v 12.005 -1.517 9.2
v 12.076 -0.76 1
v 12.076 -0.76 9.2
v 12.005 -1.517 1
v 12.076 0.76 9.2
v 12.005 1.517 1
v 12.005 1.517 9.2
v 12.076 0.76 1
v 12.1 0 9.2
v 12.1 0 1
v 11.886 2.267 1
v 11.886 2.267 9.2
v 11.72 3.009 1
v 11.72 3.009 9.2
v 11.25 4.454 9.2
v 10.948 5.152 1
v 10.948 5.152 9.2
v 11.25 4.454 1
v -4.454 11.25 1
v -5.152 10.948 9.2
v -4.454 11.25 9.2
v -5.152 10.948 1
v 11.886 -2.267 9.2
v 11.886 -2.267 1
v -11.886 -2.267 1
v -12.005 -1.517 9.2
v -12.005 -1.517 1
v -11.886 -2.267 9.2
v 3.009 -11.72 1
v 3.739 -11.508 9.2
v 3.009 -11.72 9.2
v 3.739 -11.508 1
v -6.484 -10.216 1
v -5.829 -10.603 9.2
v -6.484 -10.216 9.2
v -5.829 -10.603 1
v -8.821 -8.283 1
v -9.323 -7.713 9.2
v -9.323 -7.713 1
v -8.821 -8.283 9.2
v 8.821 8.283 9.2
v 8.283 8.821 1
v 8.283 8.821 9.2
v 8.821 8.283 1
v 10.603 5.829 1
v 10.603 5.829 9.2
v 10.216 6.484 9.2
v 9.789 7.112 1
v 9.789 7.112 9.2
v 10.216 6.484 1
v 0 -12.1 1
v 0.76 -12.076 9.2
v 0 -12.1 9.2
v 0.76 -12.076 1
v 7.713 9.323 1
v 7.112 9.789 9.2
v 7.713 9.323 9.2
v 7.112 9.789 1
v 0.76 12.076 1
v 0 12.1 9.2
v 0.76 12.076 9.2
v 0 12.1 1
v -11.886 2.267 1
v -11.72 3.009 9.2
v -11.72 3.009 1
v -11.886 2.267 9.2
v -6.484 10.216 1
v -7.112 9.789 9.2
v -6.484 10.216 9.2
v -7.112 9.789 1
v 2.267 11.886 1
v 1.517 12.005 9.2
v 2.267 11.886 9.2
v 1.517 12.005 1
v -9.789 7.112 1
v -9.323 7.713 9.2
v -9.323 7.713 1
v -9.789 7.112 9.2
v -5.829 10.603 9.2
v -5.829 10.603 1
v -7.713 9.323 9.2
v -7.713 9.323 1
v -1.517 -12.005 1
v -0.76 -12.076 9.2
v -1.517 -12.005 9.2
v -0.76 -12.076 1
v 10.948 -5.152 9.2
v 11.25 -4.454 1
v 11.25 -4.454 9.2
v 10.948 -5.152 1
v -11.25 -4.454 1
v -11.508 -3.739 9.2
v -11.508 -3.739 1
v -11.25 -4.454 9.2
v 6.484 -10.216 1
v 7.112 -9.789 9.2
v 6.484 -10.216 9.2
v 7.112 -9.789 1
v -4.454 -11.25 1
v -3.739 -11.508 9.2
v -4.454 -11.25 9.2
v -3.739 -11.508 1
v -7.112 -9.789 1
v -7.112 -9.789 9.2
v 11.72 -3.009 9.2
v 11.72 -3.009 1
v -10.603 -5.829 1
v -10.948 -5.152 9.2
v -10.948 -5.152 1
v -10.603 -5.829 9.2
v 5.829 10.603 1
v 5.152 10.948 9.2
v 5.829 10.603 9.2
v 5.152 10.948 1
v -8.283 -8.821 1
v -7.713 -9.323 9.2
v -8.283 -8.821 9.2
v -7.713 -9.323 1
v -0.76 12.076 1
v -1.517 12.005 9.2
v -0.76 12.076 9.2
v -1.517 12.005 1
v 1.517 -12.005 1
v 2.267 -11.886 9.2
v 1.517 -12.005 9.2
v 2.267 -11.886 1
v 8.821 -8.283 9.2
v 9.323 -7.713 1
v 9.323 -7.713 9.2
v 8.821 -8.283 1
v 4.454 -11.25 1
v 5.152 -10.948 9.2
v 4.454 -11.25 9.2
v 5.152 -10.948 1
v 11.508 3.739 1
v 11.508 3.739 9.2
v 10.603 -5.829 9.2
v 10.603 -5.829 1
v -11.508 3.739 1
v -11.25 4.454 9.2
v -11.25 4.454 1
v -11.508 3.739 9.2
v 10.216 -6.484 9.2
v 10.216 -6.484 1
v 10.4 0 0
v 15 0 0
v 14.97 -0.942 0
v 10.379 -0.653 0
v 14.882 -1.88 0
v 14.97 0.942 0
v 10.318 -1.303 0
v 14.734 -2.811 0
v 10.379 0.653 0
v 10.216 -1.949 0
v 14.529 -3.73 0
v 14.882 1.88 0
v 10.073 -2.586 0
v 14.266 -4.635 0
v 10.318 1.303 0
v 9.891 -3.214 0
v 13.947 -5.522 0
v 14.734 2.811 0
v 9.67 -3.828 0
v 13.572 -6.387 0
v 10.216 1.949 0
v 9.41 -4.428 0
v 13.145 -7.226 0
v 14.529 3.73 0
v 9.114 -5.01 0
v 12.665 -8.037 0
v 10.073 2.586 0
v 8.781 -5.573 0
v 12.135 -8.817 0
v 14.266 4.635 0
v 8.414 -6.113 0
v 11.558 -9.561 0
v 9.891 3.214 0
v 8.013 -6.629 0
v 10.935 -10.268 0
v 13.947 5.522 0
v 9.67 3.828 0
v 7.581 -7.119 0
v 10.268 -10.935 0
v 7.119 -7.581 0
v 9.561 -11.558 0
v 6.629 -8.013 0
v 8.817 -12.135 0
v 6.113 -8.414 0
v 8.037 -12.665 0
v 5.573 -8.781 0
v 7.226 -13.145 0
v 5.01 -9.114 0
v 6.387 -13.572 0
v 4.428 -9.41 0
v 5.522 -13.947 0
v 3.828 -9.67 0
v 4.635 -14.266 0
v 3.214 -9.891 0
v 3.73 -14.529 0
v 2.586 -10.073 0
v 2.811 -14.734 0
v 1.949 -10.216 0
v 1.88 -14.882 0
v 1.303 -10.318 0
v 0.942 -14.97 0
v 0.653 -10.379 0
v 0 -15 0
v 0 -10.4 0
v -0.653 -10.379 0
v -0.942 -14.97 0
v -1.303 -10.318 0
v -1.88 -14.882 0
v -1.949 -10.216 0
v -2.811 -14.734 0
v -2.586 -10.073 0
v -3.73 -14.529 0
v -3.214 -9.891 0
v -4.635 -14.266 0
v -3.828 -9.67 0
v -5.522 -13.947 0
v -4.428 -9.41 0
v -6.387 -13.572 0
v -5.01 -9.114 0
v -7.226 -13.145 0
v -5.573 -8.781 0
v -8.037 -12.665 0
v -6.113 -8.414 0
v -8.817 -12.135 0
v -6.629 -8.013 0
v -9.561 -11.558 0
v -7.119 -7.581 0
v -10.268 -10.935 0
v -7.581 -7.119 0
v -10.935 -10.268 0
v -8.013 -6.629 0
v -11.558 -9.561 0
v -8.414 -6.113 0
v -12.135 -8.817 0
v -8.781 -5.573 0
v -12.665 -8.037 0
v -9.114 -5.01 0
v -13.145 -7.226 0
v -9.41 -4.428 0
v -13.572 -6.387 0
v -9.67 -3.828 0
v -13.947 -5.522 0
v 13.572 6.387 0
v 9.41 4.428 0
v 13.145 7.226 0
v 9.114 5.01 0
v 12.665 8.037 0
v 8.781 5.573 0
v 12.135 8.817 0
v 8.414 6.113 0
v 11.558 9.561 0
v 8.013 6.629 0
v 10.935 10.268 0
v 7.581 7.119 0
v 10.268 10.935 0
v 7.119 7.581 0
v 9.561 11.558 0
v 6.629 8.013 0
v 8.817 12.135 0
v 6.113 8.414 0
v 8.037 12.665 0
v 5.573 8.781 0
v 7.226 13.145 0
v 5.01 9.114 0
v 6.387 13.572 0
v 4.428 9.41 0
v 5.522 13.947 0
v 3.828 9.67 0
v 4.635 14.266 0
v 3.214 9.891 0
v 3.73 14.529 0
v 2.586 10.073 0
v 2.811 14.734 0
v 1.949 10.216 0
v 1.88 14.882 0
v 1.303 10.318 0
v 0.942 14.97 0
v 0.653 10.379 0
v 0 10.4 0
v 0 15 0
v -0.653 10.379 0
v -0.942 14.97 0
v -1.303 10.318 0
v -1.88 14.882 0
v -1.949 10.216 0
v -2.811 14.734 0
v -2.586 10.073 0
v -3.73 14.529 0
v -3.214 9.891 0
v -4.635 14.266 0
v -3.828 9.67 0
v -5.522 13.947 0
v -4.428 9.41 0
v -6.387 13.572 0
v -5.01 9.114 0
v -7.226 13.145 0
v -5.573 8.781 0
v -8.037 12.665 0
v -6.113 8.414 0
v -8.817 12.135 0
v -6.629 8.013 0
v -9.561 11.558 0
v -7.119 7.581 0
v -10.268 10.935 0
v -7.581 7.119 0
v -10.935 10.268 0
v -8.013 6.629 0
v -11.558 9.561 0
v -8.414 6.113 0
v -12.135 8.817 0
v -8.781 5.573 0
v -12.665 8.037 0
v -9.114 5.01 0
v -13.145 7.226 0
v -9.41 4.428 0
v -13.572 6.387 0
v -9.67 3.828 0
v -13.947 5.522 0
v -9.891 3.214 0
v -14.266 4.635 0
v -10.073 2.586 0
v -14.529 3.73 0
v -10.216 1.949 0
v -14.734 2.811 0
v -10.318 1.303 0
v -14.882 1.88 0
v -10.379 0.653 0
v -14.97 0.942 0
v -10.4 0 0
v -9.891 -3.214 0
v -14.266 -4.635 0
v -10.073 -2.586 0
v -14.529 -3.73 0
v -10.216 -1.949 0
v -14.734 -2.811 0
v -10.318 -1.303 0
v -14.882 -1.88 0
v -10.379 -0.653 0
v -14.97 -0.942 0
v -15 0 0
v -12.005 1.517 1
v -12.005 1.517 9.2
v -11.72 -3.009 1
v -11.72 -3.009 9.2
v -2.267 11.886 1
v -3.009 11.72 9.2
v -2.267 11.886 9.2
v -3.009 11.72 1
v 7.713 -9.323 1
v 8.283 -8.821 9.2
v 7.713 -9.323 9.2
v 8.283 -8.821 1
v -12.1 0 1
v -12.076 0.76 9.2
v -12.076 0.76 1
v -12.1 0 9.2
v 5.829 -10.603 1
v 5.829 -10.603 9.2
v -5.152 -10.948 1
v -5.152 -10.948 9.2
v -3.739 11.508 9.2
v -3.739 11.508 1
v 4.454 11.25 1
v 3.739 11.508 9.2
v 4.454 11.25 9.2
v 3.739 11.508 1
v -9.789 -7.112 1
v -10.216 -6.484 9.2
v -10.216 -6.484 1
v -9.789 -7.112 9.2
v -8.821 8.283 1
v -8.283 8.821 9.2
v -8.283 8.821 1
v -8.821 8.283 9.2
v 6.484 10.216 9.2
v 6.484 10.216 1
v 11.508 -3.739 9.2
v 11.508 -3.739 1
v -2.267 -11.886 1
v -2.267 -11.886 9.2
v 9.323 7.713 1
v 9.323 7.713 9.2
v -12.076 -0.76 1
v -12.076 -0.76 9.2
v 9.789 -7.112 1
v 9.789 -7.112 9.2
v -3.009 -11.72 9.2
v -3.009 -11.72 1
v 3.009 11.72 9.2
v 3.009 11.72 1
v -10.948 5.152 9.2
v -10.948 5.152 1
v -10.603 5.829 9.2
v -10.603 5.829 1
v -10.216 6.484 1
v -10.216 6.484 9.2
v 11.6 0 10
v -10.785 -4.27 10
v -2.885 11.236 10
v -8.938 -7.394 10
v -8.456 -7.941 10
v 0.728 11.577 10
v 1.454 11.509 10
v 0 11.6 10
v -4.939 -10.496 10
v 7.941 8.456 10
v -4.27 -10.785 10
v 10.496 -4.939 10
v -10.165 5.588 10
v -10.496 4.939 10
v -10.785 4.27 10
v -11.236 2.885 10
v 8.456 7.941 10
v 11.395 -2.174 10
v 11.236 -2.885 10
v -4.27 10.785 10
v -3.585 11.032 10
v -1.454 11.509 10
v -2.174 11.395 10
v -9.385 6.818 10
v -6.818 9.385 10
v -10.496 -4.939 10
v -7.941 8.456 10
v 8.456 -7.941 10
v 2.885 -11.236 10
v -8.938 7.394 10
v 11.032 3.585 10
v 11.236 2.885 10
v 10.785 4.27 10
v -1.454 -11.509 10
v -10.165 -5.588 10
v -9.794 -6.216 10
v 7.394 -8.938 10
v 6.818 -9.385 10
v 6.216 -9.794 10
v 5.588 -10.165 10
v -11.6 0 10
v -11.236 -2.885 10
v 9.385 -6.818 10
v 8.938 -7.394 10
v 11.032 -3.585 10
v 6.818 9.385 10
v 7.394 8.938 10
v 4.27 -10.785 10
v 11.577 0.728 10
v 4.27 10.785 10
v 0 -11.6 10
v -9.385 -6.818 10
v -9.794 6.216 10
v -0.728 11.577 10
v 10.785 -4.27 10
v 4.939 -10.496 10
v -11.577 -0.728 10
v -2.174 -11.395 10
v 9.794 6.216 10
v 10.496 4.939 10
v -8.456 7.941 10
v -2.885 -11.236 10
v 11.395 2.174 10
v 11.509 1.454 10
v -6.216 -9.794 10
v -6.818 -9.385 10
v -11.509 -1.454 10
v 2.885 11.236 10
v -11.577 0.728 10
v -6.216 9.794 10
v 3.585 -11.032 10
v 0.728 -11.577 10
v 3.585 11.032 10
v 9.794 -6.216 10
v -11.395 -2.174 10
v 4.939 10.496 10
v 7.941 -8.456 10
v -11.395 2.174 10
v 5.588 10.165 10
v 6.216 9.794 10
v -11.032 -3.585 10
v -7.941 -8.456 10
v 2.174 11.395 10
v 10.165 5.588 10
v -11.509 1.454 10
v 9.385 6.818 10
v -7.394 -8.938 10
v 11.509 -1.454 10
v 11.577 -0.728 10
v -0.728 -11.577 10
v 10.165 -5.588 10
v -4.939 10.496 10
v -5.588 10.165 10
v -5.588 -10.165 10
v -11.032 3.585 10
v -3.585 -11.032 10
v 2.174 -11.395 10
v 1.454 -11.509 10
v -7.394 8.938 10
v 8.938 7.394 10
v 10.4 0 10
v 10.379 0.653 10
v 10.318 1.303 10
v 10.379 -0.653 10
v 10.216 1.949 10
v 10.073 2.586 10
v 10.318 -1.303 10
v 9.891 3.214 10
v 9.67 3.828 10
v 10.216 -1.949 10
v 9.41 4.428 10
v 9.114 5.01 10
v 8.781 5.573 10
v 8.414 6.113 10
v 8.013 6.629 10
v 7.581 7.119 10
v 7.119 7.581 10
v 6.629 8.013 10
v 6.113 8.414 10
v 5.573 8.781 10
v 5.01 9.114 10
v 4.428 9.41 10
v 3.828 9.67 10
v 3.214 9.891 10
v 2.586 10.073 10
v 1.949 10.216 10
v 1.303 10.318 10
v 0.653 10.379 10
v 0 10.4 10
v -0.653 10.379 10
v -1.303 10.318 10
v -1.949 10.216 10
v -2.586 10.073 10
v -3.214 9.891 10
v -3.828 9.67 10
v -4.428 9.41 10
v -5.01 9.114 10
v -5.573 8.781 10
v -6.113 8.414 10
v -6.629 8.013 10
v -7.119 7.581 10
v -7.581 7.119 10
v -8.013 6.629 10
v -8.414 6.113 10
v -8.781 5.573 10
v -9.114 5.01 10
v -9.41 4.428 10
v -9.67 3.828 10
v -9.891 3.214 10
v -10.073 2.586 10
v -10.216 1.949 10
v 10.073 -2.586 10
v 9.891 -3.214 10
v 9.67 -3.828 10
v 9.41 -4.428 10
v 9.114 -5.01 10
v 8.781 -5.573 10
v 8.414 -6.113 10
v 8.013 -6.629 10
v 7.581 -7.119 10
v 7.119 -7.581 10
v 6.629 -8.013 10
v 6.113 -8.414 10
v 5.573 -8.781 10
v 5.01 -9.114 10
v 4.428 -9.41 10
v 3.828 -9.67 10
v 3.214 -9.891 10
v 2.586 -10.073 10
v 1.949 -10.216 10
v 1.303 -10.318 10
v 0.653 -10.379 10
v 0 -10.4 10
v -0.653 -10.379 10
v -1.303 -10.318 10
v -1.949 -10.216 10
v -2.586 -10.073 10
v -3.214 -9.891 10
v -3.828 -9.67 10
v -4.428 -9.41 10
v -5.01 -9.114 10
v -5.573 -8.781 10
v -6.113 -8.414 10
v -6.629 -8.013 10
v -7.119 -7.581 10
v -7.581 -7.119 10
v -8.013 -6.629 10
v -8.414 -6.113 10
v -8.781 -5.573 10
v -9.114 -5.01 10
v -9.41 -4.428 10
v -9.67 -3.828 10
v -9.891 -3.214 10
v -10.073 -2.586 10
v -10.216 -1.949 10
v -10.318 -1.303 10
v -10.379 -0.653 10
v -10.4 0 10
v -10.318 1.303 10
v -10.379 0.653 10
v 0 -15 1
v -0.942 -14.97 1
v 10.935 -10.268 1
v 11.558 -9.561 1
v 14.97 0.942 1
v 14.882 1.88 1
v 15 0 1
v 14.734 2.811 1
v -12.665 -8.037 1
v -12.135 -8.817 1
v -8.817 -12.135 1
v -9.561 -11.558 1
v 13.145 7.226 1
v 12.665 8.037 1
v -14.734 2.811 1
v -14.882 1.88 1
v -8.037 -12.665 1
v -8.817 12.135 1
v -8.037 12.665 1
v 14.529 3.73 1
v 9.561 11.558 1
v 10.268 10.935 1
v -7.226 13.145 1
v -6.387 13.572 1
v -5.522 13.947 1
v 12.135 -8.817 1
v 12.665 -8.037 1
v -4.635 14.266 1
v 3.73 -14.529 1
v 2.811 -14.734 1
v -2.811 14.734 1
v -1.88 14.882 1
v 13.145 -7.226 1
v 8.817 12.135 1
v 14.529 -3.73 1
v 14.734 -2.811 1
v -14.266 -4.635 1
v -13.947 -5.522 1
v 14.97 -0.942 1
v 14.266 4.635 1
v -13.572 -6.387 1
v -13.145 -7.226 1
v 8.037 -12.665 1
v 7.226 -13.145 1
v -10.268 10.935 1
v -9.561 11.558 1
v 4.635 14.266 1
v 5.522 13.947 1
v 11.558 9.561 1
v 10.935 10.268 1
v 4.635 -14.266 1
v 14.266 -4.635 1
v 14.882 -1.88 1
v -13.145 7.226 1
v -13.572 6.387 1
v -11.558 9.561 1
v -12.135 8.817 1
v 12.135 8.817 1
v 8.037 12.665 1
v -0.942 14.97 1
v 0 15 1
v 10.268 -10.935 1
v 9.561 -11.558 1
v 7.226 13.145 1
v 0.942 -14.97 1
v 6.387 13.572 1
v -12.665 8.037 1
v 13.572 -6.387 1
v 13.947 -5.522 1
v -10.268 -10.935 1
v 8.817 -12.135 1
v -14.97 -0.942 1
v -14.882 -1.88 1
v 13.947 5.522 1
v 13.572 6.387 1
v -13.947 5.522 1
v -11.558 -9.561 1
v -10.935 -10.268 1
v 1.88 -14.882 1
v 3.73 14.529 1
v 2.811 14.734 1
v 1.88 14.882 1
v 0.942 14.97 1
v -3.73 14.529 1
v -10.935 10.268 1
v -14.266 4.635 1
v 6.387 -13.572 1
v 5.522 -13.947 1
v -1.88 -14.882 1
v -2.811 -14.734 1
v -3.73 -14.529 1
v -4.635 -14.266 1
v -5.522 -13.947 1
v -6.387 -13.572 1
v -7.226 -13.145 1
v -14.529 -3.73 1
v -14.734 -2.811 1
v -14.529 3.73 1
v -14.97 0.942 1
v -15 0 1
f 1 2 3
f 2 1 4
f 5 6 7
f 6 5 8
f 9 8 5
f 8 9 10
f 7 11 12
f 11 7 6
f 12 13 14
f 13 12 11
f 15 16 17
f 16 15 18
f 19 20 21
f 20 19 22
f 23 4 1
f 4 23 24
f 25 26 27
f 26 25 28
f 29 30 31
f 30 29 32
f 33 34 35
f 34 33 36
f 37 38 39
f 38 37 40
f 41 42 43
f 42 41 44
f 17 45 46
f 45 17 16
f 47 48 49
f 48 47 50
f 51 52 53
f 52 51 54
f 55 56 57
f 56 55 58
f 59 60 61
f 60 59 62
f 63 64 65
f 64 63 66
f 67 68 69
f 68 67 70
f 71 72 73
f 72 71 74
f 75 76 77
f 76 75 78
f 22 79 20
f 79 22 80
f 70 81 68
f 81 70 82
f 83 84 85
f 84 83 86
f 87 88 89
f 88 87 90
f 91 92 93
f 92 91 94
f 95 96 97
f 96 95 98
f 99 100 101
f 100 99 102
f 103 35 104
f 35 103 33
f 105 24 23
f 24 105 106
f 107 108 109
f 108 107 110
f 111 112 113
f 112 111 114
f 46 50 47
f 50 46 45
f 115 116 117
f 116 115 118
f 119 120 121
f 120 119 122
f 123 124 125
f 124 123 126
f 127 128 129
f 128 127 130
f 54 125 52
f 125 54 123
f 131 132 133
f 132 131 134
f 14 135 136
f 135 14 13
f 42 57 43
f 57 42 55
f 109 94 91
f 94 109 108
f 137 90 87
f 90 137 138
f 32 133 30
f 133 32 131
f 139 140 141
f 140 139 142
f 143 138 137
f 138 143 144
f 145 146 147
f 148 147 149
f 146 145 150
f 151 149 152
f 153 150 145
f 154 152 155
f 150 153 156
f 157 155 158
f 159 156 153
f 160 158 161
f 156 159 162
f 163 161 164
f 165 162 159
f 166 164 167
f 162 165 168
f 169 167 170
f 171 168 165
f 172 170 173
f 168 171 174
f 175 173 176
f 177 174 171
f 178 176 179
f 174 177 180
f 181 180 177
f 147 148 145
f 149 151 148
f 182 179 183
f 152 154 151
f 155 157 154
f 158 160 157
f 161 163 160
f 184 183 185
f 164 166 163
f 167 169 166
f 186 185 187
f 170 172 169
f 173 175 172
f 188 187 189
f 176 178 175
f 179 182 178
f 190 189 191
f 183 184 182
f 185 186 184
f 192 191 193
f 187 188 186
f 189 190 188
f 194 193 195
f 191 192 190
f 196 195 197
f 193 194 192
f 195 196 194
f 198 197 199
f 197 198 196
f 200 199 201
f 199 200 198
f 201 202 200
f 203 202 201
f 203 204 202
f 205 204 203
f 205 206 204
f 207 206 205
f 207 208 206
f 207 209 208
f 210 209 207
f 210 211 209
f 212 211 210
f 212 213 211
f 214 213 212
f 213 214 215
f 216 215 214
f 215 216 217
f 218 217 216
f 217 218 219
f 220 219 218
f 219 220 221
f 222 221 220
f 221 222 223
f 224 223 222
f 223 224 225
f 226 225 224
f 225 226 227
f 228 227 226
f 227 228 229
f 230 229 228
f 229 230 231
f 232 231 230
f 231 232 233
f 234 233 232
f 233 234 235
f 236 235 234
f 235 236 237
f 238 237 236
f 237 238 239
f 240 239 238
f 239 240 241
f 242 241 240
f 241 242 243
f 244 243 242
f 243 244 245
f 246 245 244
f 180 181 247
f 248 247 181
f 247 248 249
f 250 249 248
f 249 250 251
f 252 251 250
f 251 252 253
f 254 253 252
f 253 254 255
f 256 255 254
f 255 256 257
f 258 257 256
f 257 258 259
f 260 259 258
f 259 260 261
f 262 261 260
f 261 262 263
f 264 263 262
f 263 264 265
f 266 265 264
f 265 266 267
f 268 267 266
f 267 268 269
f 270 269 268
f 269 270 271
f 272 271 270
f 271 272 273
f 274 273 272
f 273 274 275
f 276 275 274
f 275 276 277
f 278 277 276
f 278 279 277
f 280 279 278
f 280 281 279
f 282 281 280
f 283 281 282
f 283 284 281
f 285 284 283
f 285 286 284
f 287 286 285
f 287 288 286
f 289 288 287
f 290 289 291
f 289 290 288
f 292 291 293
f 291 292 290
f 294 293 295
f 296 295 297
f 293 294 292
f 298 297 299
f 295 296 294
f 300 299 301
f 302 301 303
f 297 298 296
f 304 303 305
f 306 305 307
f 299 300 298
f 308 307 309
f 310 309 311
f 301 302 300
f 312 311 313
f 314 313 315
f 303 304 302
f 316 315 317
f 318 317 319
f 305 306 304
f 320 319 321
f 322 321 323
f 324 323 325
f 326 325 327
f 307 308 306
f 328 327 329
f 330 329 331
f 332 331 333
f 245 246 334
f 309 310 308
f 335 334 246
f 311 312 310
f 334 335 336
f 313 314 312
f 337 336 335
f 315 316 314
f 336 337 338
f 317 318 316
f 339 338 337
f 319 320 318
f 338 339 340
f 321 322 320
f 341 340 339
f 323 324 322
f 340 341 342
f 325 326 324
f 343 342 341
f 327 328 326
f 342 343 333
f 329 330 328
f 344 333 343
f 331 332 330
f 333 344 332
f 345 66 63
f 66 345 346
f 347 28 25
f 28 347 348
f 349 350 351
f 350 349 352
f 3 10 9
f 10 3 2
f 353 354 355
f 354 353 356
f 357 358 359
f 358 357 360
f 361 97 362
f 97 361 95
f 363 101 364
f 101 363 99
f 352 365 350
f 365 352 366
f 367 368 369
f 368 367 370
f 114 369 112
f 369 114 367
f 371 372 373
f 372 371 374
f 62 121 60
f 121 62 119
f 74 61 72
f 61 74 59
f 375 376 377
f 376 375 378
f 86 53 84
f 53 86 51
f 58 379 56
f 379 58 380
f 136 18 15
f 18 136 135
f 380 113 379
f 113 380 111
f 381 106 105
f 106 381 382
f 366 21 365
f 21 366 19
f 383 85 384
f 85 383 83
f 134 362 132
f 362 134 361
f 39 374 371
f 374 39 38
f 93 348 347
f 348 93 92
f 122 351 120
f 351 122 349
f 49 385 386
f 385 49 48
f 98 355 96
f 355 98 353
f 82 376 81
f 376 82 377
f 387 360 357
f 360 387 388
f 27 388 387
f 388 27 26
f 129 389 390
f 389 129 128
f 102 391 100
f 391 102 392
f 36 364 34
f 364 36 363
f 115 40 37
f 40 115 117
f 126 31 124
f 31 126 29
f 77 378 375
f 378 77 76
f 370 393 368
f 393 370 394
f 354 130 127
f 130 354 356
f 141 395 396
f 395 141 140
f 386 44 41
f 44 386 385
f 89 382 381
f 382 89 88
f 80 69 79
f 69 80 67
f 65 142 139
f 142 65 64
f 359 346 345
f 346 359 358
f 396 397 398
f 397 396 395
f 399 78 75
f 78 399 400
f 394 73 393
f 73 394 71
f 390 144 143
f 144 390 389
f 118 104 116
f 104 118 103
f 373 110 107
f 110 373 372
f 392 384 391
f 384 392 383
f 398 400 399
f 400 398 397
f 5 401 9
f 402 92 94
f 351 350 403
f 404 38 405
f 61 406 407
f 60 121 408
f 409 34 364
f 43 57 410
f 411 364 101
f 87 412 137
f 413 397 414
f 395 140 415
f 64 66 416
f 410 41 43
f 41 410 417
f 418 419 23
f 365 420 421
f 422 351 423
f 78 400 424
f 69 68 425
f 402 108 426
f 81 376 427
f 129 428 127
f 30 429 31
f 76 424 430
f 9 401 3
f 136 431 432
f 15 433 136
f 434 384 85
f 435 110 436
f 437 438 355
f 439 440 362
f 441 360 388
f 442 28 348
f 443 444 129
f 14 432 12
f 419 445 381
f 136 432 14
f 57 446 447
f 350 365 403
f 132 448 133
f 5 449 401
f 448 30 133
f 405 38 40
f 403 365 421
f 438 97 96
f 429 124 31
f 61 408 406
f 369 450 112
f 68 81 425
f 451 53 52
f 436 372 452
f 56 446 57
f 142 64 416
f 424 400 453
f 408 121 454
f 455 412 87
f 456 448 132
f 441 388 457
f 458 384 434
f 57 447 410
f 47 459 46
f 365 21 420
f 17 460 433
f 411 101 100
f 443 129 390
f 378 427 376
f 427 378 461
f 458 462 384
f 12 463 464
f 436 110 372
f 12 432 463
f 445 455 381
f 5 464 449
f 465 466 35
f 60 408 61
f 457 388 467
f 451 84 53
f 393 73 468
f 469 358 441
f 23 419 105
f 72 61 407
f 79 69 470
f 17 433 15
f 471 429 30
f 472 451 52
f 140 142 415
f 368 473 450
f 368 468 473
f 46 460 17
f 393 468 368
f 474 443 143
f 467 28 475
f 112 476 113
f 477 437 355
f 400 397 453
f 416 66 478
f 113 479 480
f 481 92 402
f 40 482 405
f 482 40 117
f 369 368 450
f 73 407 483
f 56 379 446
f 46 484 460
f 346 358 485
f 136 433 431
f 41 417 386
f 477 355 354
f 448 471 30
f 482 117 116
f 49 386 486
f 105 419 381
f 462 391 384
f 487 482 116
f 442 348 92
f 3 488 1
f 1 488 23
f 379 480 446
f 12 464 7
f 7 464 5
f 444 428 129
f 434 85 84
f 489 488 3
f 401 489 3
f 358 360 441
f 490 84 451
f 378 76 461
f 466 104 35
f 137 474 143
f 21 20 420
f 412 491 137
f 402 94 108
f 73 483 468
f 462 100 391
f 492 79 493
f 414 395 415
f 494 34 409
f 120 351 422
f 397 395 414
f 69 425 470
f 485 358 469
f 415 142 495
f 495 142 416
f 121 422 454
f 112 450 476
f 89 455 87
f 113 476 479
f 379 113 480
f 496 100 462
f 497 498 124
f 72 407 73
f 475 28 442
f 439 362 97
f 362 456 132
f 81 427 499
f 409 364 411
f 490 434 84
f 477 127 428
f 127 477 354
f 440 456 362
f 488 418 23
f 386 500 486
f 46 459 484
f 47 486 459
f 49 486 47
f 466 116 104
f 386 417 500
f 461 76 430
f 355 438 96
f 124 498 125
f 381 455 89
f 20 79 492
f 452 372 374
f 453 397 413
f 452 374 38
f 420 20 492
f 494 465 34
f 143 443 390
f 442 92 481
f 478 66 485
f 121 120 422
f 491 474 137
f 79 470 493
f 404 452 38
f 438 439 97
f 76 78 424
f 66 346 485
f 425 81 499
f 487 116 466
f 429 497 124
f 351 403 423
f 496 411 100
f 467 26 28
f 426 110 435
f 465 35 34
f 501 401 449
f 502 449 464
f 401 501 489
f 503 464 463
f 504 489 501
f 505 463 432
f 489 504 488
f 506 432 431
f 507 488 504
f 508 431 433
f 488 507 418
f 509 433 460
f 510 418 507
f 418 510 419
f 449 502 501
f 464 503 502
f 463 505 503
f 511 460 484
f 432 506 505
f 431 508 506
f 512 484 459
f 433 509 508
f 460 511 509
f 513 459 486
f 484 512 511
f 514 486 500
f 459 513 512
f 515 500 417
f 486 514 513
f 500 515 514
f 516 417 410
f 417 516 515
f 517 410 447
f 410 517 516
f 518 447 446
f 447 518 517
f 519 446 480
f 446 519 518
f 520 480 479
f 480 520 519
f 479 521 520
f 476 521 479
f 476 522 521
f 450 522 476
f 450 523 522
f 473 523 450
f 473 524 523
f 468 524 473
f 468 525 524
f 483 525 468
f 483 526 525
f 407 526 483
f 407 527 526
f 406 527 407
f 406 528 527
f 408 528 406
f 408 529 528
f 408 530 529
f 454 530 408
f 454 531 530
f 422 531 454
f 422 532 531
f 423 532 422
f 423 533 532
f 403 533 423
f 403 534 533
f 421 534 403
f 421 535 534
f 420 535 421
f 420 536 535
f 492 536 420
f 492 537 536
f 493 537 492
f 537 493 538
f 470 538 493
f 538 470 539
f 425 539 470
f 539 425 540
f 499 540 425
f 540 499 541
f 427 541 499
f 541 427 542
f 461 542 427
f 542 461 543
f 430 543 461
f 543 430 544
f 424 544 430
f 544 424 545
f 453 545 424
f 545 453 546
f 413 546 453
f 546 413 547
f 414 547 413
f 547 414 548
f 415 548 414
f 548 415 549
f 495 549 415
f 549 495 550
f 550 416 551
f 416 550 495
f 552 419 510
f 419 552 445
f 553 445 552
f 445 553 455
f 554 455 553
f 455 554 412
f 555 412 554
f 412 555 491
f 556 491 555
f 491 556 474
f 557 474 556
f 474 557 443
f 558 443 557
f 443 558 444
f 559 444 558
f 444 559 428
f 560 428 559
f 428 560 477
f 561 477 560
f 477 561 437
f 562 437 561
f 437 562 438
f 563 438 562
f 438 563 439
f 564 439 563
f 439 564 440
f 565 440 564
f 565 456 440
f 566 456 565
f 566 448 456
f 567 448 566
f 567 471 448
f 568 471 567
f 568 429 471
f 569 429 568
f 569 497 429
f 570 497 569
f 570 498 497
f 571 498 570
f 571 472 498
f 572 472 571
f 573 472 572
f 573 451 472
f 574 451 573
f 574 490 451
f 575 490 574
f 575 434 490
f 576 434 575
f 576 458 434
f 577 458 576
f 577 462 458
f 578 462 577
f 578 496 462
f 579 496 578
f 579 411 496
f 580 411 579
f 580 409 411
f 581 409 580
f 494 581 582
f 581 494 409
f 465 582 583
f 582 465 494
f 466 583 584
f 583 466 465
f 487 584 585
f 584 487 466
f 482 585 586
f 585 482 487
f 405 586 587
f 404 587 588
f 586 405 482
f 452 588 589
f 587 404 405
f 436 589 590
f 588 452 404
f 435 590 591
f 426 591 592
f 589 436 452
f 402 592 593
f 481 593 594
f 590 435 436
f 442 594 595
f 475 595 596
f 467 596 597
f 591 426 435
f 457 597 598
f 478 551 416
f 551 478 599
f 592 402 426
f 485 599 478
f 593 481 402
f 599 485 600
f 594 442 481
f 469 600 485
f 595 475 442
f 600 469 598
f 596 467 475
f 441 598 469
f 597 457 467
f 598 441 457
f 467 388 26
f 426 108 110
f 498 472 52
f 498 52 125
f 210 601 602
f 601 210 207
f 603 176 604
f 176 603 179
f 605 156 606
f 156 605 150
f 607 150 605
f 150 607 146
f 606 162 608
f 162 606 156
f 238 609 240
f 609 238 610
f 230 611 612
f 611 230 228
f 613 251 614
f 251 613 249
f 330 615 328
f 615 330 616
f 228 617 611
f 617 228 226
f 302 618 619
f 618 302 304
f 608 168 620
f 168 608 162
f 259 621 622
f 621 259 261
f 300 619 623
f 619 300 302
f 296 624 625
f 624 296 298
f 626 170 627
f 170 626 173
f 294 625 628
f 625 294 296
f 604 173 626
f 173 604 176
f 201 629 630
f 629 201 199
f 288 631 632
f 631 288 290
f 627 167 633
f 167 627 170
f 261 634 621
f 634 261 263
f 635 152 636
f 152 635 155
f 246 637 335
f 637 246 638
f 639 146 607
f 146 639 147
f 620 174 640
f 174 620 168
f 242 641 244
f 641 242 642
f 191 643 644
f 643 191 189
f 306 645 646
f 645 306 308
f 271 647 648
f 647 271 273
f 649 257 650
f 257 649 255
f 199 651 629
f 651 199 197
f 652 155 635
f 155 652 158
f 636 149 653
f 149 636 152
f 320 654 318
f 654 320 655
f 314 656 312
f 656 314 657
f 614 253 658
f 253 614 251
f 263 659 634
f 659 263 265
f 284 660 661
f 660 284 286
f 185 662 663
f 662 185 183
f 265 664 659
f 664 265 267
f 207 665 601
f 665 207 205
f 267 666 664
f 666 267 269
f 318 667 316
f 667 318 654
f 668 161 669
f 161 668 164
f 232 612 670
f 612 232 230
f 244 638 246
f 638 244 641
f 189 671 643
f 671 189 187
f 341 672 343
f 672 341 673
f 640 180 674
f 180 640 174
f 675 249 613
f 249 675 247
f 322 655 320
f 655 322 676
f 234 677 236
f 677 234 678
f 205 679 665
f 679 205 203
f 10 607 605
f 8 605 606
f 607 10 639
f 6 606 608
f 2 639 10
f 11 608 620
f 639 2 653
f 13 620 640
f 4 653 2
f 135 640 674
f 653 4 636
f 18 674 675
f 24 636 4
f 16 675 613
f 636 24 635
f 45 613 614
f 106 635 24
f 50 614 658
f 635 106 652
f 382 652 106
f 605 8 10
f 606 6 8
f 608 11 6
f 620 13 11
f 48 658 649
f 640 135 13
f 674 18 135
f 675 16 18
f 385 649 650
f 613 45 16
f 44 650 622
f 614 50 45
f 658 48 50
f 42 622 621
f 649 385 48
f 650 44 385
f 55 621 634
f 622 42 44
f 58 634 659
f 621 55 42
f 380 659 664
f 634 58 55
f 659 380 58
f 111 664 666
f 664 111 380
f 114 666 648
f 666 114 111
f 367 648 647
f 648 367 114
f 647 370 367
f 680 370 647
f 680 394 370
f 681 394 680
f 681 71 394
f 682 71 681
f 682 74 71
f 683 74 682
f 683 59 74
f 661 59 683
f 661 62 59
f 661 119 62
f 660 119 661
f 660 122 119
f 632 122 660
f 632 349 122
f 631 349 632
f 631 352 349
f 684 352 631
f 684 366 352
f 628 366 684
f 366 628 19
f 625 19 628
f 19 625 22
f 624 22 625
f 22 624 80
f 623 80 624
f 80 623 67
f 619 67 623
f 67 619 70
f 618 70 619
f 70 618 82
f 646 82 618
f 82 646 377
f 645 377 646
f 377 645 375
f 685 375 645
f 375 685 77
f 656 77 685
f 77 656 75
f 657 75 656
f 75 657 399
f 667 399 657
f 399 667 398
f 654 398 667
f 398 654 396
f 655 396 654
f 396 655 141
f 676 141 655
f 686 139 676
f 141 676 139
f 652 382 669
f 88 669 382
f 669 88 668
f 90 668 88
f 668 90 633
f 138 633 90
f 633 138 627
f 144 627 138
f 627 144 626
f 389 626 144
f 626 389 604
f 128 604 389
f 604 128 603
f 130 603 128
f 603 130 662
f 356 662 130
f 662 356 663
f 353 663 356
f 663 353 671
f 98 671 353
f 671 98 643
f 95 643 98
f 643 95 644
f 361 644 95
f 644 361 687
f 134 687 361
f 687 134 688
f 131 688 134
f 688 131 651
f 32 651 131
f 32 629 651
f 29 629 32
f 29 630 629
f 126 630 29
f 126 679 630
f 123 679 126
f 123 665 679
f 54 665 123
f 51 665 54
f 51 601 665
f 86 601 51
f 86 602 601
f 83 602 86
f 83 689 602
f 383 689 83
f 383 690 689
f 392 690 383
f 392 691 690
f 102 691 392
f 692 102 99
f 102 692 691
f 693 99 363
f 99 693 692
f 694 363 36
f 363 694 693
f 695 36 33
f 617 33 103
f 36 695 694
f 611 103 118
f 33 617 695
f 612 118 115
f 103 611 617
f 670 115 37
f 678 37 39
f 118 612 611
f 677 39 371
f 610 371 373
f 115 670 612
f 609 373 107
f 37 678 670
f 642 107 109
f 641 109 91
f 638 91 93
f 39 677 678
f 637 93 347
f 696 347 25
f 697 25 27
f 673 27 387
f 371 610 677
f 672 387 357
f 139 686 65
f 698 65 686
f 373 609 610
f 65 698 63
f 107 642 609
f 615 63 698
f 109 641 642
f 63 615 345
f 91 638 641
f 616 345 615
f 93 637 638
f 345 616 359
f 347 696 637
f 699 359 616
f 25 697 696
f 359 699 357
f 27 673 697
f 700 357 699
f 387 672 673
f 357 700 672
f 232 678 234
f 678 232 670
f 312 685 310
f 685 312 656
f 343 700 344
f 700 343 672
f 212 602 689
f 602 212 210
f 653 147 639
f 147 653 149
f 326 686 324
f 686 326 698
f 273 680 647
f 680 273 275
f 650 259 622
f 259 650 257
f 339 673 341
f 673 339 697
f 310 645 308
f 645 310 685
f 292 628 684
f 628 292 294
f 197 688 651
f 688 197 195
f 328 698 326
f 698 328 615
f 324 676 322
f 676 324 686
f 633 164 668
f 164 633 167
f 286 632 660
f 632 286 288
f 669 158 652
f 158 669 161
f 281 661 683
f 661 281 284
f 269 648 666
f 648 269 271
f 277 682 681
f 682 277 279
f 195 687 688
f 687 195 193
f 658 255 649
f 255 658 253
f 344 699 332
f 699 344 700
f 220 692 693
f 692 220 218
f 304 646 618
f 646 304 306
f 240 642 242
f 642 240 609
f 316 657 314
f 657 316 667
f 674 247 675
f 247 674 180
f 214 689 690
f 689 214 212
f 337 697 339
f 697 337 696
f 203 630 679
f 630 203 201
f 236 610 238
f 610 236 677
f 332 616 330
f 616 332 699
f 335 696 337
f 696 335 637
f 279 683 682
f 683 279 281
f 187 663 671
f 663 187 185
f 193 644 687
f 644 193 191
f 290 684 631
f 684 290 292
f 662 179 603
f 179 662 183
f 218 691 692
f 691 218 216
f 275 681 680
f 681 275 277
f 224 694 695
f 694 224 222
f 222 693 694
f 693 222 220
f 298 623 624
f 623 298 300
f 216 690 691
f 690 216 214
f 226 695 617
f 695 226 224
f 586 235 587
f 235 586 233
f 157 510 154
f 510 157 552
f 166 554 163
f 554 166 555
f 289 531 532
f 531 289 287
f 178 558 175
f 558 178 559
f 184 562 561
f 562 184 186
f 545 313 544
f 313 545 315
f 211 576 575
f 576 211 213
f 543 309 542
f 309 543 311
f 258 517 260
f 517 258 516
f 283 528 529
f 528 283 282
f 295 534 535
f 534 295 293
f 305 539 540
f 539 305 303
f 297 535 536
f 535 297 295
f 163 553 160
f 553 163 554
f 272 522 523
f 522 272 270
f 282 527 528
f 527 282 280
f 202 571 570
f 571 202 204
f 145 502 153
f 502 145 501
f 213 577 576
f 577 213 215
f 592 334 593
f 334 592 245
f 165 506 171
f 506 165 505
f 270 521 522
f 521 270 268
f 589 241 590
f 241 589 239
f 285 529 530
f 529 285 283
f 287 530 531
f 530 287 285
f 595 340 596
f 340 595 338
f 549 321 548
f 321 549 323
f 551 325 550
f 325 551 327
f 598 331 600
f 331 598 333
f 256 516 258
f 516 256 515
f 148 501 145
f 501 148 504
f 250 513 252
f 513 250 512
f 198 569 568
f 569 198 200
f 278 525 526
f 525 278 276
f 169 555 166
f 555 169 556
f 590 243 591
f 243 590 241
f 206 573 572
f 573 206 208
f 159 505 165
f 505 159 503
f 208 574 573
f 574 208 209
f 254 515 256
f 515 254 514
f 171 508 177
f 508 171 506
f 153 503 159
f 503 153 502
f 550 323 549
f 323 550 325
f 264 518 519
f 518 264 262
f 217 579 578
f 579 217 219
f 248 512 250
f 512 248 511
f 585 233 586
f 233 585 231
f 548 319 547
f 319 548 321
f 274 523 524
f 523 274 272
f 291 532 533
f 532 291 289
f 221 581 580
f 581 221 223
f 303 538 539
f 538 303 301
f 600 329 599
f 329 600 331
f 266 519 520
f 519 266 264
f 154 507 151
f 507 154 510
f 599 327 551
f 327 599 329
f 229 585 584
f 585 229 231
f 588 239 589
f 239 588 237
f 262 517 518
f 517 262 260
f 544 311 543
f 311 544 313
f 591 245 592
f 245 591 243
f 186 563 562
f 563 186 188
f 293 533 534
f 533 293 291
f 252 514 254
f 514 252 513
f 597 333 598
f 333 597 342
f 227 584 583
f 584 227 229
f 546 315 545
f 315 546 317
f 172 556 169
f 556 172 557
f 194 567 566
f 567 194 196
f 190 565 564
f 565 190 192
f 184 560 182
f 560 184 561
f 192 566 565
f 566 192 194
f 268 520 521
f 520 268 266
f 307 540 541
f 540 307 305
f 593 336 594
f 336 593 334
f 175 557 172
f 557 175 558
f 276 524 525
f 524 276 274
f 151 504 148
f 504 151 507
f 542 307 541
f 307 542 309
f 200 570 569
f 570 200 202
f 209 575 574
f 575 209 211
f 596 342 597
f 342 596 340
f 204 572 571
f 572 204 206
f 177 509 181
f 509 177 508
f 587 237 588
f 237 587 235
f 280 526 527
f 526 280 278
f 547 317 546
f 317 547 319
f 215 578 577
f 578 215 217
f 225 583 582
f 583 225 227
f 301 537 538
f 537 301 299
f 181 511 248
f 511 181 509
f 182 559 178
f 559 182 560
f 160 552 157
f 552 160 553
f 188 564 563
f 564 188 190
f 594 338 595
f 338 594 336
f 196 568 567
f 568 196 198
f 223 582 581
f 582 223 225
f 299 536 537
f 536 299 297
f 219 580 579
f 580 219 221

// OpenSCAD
//igus bearing-generator – fully customizable
// -Beta test - v. 0.8 - 30.12.16  Tom Krause

//Use iglidur tribofilament in order to reach similar wear-characteristics as with conventional iglidur bearings. Always lubricant-free, maintenance-free and easy to print with iglidur I150 tribofilament.

//Check this website for more information: www.igus.eu/tribofilament

//Here are some tips how to use the "bearing-generator":
    //Choose "flange", if you have axial forces.
    //Choose "slit", if the bearing should have a slit in order to mount it more easily.
    //Be aware of clearance.
    //Be aware that the real inside-diameter will be smaller than in the 3d-model.
    //Be aware of oversize at the outside-diameter. If you want to have one “press-fit”.
    //Settings at the printer: with small wall-thicknesses you may need to reduce the “parameters” to 1 and you may also need to adjust the “shell-thickness”. Otherwise changes at the 3d-model won’t affect the printed part.
//Choose with or without flange
flange="yes"; // [yes,no]
//Choose with or without slit
slit="no"; // [yes,no]
//[mm]
insidediameter=10.4;
//[mm]
outsidediameter=12.1;
//[mm]
length=10.0;
//[mm] no effect when "no flange" selected
flangediameter=15.0;
//[mm] no effect when "no flange" selected
flangethicknes=1.0;
//[mm] no effect when "no slit" selected
slit_width=1.0;
//[°] no effect when "no slit" selected
slit_angle=10; // [0,10,20]
d1=insidediameter;
d2=outsidediameter;
b1=length;
d3=flangediameter;
b2=flangethicknes;
b3=slit_width;
a=slit_angle;
if(((b2+1)>b1)&&flange=="yes")
   {translate([d3+d2+d1,0,b1+3])text("flange too thick",size=(8+(d3+d2+d1)/3));}
if((d2-d1)<1)
   {translate([d3+d2+d1,(14+(d3+d2+d1)/3),b1+3])text("increase wallthickness",size=(8+(d3+d2+d1)/3));}
if(d3<d2&&flange=="yes")
   {translate([d3+d2+d1,-(14+(d3+d2+d1)/3),b1+3])text("increase flangediameter",size=(8+(d3+d2+d1)/3));}  
    module bearing() 
{ 
    if(flange=="no") {difference() { 
    union () {cylinder(b1-0.8,d2,d2,$fn=100);translate([0,0,b1-0.8]) 
    cylinder(0.8,d2,d2-0.5,$fn=100);}
    translate([0,0,-1]) 
    cylinder(b1+2,d1,d1,$fn=100);if(slit=="yes") { translate([d2,0,b1/2-1]) rotate([a,0,0]) cube([d2*2,b3,b1*1.5+4],center=true);}}
    }
    else
        difference() { 
    union () {cylinder(b1-0.8,d2,d2,$fn=100);translate([0,0,b1-0.8]) 
    cylinder(0.8,d2,d2-0.5,$fn=100);cylinder(b2,d3,d3,$fn=100);}
    translate([0,0,-1]) 
    cylinder(b1+2,d1,d1,$fn=100);if(slit=="yes") { translate([d3,0,b1/2-1]) rotate([a,0,0]) cube([d3*2,b3,b1*1.5+4],center=true);}}   
}
bearing();
